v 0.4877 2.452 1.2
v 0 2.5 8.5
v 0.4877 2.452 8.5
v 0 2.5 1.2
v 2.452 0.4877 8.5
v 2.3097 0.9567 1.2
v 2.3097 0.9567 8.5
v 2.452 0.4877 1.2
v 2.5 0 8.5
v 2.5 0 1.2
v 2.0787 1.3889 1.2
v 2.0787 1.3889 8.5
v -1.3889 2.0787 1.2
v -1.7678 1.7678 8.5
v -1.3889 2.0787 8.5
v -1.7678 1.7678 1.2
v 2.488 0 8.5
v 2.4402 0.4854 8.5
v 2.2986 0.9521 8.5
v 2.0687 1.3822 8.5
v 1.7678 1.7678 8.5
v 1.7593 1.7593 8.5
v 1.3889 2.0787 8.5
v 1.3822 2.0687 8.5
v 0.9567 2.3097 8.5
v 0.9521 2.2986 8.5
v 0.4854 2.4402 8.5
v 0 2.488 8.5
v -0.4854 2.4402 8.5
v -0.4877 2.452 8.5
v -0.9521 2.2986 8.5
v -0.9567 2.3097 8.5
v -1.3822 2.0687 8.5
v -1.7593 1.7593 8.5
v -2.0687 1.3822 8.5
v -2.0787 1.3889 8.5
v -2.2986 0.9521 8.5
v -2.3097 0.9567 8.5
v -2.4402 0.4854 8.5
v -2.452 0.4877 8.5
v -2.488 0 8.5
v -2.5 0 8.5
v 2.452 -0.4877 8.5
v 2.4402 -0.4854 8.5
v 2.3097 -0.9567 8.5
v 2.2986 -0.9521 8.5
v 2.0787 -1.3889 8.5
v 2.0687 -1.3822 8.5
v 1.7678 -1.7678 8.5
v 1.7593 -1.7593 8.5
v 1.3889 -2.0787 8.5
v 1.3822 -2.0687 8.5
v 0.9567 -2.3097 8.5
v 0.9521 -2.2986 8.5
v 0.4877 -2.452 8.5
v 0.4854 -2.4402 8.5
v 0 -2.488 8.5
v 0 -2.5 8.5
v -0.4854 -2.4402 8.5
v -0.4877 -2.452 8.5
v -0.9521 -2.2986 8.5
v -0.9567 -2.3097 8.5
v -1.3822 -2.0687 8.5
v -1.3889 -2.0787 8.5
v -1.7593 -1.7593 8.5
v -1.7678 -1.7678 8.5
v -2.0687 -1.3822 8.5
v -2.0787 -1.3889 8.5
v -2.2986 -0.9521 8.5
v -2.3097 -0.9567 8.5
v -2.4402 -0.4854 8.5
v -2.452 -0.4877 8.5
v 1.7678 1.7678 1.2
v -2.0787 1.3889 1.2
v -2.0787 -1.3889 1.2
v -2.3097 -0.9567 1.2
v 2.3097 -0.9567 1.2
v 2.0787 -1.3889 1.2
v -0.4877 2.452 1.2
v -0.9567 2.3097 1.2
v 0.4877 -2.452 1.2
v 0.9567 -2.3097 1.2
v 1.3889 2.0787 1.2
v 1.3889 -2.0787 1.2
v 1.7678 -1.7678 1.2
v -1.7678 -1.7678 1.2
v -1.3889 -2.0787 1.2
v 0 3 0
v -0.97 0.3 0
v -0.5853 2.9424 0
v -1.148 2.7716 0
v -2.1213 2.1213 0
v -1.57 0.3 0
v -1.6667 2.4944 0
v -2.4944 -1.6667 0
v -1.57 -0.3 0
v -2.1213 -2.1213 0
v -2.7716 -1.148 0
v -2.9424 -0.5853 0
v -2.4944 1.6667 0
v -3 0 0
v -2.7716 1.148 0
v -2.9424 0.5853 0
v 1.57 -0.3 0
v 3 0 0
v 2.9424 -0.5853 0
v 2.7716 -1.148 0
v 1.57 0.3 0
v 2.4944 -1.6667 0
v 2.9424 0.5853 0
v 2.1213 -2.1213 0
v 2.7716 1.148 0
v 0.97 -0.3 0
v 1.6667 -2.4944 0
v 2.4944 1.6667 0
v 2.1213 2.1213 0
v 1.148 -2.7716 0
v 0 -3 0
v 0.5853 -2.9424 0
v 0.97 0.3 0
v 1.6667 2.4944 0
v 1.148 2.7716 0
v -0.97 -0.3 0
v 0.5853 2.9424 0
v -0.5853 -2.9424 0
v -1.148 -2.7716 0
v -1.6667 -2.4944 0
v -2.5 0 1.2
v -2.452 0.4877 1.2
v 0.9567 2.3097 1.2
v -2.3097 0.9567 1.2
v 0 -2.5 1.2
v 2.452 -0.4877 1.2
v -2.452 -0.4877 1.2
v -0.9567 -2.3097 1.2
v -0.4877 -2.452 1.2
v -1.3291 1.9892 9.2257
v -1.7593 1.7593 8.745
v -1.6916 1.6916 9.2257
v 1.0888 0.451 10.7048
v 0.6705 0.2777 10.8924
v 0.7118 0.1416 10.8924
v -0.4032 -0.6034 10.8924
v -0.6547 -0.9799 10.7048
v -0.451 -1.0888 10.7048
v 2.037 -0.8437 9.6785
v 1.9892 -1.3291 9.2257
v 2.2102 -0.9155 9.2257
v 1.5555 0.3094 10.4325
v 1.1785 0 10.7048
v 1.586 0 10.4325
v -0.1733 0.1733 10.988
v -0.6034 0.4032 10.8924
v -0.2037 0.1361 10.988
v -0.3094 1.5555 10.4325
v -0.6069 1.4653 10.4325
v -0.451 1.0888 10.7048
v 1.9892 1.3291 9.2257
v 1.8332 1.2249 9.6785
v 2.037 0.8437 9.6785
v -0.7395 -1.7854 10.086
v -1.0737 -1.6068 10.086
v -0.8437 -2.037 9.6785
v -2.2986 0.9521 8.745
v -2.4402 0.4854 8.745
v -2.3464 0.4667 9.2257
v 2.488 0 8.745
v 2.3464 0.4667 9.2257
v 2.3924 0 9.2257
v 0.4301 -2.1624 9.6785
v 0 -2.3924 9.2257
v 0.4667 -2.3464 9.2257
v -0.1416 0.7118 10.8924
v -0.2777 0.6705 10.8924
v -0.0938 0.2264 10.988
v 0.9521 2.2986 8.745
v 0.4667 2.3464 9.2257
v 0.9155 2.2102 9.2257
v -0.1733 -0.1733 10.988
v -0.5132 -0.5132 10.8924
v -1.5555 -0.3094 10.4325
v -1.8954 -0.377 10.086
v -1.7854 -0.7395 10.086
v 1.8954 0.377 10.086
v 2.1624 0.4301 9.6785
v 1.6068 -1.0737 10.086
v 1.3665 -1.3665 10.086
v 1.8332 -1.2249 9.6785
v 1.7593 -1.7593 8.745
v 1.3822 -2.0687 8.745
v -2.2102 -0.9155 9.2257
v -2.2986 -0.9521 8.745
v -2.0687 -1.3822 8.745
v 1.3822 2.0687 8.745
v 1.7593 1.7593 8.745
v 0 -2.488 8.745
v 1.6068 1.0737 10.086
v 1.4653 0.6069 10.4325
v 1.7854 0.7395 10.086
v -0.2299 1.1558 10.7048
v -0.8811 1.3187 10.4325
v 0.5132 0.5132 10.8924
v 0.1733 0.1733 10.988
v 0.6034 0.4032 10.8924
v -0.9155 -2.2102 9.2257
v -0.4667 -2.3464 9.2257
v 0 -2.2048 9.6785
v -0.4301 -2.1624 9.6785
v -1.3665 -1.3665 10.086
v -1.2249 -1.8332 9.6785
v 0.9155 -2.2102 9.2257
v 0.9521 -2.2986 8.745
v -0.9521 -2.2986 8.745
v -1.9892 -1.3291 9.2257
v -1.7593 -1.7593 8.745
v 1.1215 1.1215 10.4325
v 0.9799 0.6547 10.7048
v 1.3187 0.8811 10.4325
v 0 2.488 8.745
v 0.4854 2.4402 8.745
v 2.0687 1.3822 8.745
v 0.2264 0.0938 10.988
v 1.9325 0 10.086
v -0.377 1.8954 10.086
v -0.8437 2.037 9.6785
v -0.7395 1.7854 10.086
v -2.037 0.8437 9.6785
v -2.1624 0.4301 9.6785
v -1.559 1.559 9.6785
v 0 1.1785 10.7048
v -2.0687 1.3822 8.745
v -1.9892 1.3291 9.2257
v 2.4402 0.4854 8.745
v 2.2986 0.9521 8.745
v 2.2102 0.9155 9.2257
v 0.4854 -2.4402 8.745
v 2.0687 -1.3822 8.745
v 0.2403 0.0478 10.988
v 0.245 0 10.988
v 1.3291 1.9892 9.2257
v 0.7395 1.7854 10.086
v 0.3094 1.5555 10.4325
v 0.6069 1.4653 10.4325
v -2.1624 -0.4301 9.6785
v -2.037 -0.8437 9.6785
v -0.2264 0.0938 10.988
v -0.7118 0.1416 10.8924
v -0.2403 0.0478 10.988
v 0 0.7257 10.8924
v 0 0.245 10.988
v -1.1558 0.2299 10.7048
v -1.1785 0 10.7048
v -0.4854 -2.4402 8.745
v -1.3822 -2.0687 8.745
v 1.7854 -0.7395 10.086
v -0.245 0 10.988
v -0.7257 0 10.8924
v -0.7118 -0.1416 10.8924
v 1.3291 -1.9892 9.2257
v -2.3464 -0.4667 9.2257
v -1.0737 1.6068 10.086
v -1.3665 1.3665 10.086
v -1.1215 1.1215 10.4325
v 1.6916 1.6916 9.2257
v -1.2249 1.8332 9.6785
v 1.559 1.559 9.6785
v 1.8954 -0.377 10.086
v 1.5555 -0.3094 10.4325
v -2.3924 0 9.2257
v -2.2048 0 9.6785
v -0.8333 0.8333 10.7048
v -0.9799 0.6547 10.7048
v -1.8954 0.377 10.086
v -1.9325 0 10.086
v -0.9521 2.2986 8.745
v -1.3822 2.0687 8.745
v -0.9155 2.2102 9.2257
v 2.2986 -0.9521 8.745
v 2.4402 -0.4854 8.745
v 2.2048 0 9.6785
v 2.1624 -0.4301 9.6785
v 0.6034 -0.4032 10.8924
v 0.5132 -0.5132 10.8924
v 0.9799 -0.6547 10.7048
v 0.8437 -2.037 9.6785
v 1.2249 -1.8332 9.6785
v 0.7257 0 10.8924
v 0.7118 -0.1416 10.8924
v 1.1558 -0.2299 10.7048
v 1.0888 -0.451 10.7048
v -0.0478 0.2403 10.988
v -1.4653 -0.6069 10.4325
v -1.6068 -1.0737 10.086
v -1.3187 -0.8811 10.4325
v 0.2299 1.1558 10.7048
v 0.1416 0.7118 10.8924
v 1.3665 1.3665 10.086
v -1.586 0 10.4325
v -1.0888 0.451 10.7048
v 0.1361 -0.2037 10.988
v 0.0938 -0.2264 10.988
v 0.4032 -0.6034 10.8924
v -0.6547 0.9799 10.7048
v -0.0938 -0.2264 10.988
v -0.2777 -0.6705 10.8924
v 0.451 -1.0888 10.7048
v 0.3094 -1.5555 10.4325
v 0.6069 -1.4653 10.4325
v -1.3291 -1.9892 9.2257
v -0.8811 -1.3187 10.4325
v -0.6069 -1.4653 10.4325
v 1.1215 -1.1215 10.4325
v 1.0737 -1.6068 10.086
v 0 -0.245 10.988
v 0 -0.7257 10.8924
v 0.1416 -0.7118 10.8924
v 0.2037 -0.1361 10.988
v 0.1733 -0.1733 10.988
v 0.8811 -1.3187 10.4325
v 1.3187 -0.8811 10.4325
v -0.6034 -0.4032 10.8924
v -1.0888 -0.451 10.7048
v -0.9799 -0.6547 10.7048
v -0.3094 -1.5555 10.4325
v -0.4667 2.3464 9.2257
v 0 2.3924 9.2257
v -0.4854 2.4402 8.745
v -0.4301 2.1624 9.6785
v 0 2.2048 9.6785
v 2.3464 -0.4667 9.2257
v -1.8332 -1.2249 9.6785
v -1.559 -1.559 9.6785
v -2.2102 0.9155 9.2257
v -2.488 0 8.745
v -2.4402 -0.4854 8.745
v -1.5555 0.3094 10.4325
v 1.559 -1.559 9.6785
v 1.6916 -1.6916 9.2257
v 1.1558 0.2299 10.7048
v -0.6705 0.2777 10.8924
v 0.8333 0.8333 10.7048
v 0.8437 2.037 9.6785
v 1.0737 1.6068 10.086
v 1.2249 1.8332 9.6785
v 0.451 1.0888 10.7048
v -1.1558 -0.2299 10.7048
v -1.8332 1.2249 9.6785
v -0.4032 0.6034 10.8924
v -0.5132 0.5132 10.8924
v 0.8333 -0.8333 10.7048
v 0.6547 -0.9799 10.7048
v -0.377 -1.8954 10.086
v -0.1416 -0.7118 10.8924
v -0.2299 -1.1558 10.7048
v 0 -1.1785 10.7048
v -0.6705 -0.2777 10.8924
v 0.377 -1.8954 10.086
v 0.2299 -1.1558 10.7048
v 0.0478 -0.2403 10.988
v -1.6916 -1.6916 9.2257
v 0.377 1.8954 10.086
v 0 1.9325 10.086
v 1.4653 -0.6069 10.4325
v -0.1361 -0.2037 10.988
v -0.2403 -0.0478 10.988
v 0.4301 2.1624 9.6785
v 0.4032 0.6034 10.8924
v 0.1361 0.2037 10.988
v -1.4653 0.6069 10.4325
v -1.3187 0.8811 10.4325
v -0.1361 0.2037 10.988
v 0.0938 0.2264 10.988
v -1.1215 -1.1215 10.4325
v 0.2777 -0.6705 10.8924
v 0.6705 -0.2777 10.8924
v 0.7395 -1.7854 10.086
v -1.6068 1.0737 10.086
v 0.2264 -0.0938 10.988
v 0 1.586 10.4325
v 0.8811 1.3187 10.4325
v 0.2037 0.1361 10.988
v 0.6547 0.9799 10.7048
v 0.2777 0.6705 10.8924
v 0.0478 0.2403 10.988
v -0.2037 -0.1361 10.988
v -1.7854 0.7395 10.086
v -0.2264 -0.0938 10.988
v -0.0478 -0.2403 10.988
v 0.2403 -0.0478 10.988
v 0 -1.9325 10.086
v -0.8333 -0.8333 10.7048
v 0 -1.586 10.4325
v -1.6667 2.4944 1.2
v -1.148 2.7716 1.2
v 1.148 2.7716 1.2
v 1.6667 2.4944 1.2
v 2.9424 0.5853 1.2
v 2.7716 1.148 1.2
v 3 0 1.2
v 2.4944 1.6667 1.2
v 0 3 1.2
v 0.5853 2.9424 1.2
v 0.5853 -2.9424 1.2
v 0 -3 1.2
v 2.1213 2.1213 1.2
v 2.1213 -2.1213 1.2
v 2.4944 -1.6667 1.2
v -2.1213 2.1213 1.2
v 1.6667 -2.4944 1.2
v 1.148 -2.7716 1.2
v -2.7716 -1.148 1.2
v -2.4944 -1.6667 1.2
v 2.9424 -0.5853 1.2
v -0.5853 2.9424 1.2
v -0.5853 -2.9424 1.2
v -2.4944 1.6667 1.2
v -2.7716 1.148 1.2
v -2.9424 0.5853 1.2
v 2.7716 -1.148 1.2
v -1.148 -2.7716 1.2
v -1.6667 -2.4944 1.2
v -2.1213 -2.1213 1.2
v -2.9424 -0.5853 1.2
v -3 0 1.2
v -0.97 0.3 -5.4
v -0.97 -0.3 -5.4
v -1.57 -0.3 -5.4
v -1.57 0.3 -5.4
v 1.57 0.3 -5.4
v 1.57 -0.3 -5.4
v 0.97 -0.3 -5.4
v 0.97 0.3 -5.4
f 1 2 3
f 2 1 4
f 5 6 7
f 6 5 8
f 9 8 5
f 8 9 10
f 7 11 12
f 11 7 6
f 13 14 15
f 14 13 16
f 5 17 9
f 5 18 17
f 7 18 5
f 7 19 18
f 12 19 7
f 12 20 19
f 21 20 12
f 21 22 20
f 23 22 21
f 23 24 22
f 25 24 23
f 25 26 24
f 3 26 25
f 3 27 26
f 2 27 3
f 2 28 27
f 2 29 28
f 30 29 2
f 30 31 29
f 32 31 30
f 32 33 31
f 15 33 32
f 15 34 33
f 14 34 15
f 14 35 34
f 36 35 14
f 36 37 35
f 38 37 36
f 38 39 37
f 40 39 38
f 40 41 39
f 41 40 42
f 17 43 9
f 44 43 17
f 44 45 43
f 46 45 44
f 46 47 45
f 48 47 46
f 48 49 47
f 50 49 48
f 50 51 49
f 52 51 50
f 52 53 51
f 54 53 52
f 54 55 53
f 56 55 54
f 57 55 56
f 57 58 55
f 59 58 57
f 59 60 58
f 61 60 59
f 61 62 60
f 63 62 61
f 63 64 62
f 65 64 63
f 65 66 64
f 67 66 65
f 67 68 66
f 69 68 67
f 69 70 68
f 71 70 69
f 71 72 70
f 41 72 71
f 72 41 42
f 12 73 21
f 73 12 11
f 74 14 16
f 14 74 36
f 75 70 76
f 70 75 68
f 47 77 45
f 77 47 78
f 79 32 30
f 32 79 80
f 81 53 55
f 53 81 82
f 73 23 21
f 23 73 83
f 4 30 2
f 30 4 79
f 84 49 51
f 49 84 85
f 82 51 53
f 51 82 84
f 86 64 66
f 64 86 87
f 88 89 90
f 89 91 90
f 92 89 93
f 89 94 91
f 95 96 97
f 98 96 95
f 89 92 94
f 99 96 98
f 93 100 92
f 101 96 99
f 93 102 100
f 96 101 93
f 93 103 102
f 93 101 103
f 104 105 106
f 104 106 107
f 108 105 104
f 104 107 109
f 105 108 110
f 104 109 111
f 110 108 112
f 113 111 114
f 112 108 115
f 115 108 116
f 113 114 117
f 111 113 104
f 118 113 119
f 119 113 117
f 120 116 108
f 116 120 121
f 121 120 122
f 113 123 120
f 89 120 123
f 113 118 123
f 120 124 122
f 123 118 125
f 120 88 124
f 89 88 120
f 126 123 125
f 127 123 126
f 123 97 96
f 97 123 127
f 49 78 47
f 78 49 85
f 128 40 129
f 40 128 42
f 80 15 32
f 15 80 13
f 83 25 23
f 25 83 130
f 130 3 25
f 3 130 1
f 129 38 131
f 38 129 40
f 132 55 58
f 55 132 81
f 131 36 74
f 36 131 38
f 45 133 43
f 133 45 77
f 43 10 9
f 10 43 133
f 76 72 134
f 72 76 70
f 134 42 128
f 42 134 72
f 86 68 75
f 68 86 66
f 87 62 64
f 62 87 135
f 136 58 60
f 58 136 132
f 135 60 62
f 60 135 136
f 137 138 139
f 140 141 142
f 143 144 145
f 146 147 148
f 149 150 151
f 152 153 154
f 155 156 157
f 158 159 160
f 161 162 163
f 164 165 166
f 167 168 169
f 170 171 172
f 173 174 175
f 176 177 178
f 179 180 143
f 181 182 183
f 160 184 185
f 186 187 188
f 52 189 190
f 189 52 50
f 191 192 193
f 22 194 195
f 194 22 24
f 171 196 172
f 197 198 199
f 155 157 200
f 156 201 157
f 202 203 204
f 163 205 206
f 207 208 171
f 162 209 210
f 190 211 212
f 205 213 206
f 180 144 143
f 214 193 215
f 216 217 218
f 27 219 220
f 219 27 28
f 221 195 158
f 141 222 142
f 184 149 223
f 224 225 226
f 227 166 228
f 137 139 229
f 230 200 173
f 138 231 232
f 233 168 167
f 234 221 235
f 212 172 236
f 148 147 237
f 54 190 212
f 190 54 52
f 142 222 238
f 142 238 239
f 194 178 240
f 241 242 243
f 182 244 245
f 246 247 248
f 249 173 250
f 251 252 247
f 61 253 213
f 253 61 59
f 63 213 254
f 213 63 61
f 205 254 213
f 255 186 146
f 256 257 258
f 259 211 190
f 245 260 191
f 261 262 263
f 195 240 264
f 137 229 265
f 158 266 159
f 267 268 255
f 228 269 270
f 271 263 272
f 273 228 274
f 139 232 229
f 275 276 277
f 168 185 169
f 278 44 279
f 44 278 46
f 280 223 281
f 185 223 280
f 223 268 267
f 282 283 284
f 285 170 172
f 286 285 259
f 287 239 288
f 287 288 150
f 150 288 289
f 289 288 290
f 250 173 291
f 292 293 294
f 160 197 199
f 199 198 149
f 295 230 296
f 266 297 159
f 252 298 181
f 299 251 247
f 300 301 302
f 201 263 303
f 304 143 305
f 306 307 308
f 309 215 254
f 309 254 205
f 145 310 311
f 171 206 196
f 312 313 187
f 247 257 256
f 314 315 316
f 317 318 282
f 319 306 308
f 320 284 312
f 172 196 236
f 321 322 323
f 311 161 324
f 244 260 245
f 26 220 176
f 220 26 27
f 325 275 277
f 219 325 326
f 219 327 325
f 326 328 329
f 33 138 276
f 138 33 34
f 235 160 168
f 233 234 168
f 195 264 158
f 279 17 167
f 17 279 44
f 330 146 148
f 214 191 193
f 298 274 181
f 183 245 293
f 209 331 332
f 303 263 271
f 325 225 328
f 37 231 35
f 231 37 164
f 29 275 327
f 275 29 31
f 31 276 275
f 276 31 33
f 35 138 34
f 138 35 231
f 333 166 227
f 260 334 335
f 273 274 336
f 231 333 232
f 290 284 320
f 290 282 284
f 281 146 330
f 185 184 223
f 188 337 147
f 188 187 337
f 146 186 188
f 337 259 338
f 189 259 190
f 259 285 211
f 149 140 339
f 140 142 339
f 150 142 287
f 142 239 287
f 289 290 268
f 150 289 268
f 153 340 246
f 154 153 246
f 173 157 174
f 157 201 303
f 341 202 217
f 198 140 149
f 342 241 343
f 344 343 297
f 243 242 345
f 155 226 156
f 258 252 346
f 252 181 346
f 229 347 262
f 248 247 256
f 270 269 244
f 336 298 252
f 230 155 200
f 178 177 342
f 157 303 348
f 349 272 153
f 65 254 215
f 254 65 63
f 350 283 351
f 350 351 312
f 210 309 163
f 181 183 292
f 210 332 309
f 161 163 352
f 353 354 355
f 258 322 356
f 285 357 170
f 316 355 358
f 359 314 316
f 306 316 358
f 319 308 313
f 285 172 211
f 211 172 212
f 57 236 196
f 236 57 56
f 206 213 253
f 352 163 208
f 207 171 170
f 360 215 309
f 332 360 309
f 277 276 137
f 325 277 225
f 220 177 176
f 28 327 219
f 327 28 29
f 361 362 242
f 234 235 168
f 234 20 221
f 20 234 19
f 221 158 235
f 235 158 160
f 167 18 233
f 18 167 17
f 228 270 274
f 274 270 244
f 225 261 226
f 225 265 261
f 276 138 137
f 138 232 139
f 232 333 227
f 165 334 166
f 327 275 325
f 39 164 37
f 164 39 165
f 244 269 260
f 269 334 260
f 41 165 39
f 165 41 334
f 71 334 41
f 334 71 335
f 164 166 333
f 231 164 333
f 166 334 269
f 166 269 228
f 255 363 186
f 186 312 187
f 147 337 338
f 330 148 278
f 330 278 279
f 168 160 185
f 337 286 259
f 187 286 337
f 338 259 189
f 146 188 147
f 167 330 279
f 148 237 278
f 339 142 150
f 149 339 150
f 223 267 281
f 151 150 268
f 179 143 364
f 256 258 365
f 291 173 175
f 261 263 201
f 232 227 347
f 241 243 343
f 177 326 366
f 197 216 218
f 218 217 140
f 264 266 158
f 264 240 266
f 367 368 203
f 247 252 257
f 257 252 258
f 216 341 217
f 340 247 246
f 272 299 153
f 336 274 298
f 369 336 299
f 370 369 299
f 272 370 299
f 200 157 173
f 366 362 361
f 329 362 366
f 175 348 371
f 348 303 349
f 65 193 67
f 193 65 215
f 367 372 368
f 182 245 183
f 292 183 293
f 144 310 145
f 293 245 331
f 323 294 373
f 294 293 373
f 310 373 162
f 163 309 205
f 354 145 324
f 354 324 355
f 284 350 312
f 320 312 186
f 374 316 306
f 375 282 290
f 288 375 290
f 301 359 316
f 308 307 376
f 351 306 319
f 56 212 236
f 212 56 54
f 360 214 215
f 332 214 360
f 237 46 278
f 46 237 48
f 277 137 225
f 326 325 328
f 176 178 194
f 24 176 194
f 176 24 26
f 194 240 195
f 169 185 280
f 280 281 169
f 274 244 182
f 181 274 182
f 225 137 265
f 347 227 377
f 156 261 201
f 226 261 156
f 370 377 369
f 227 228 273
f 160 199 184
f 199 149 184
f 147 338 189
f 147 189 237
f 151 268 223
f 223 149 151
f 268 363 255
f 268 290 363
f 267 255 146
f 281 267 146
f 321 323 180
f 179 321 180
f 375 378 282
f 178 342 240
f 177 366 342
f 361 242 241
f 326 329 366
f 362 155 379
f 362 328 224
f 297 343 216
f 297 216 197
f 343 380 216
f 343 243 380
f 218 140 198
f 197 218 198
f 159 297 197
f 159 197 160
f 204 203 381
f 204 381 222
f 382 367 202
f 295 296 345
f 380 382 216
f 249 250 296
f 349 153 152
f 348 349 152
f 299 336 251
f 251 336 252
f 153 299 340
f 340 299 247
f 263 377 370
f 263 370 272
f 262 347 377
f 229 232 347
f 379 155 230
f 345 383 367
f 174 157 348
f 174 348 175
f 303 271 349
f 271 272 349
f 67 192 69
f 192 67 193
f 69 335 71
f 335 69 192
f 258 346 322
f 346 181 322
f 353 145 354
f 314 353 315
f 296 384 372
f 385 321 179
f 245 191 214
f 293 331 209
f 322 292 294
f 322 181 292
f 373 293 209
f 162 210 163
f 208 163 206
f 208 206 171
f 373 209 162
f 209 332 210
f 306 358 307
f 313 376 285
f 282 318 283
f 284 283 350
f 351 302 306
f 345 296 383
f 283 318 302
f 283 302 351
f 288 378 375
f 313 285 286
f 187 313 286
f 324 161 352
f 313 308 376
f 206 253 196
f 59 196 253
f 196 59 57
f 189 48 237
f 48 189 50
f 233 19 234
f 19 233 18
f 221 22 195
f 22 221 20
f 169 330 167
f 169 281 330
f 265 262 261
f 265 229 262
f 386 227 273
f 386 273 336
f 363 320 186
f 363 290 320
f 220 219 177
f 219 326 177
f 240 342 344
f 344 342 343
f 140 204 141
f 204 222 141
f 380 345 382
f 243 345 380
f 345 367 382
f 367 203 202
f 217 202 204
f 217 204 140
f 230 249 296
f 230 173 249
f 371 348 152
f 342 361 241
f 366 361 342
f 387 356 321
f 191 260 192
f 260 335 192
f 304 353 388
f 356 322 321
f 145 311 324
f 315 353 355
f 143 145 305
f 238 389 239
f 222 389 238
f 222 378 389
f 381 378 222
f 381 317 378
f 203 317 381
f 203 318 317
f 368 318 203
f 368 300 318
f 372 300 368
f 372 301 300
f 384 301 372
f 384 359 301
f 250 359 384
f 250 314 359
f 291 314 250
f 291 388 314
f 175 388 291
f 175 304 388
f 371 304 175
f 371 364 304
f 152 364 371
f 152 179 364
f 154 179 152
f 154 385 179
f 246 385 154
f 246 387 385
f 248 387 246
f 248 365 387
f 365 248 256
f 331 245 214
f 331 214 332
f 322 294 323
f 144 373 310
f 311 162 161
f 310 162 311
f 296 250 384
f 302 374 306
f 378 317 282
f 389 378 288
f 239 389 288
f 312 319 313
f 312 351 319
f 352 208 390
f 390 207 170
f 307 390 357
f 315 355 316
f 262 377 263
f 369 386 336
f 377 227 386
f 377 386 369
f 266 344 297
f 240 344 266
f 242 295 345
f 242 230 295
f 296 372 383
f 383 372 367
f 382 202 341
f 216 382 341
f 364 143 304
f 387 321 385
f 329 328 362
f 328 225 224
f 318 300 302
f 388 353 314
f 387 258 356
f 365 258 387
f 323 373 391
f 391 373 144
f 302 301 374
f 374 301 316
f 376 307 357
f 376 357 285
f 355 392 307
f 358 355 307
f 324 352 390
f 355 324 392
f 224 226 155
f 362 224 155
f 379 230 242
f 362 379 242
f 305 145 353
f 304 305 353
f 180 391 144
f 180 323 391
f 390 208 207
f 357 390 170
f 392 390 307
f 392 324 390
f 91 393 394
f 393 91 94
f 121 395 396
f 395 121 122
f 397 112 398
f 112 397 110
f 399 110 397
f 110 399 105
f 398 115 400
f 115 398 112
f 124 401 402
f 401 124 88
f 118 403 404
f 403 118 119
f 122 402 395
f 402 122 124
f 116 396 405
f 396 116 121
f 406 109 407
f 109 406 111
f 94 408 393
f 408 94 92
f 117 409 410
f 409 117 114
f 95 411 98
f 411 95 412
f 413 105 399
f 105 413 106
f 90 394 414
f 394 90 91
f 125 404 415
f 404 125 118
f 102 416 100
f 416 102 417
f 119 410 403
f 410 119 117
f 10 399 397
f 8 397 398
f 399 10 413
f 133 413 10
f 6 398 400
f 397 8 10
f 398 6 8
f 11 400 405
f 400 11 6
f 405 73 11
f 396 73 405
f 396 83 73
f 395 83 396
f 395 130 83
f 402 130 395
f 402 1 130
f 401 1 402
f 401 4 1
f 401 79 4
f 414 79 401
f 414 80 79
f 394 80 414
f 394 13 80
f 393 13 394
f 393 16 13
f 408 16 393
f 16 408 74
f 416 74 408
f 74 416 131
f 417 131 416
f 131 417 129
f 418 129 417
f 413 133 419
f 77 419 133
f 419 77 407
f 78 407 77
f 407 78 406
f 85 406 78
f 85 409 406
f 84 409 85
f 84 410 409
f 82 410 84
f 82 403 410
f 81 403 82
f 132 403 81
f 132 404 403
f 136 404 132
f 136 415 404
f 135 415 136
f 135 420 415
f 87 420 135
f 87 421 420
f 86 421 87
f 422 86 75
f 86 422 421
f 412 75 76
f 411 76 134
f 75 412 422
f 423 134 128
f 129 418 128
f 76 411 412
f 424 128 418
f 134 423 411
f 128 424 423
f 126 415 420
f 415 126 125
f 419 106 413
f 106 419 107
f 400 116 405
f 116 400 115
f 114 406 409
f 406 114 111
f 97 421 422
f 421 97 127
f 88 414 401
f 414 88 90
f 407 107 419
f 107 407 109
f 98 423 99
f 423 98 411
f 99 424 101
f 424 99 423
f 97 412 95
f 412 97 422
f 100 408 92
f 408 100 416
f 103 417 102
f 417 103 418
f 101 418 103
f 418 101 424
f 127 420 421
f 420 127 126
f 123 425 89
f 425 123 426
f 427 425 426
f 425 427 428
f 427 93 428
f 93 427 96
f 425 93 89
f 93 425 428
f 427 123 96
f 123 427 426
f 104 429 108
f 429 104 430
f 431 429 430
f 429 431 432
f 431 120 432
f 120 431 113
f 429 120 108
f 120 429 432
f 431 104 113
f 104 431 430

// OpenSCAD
// Parameters
type = 0; //[0:2:1]
colour = 0; //[0:5:1]
lead = 5; //[2.5:10:0.5]
right_angle = 0; //[0:12:1]
eps = 0.8; //[0.5:2:0.1]
led_d = 5; //[3:10:1]
led_h = 8.5; //[5:17:0.5]
rim_t = 1.2; //[0.6:2.4:0.1]
rim_d = 6; //[3.6:12:0.2]
lead_t = 0.6; //[0.4:1.2:0.05]
lead_pitch = 2.54; //[1.5:5:0.01]
bend_r = 0.8; //[0.4:2:0.1]

// LED Module
module led() {
  // LED Body
  color("red") {
    union() {
      // Main cylindrical body
      translate([0, 0, led_h/2])
        cylinder(r=led_d/2, h=led_h, center=true, $fn=32);
      // Dome on top
      translate([0, 0, led_h])
        sphere(r=led_d/2, $fn=32);
      // Rim at the base
      translate([0, 0, rim_t/2])
        cylinder(r=rim_d/2, h=rim_t, center=true, $fn=32);
    }
  }
  
  // LED Leads
  color("Silver") {
    if (right_angle == 0) {
      // Straight leads
      union() {
        translate([-lead_pitch/2, 0, -(lead + eps)/2 + eps/2])
          cube([lead_t, lead_t, lead + eps], center=true);
        translate([lead_pitch/2, 0, -(lead + eps)/2 + eps/2])
          cube([lead_t, lead_t, lead + eps], center=true);
      }
    } else {
      // Right-angle leads
      union() {
        // Vertical part of the bend
        translate([-lead_pitch/2, 0, -(right_angle + eps)/2 + eps/2])
          cube([lead_t, lead_t, right_angle + eps], center=true);
        translate([lead_pitch/2, 0, -(right_angle + eps)/2 + eps/2])
          cube([lead_t, lead_t, right_angle + eps], center=true);
        
        // Horizontal part of the bend
        translate([-lead_pitch/2, -(right_angle + eps)/2 - lead_t/2 + eps/2, -right_angle + lead_t/2])
          cube([lead_t, right_angle + eps, lead_t], center=true);
        translate([lead_pitch/2, -(right_angle + eps)/2 - lead_t/2 + eps/2, -right_angle + lead_t/2])
          cube([lead_t, right_angle + eps, lead_t], center=true);
        
        // After bend
        translate([-lead_pitch/2, -(right_angle + eps) - (lead + eps)/2 - lead_t + eps, -right_angle + lead_t/2])
          cube([lead_t, lead + eps, lead_t], center=true);
        translate([lead_pitch/2, -(right_angle + eps) - (lead + eps)/2 - lead_t + eps, -right_angle + lead_t/2])
          cube([lead_t, lead + eps, lead_t], center=true);
        
        // Bend corners
        translate([-lead_pitch/2, -lead_t/2, -right_angle])
          sphere(r=bend_r, $fn=16);
        translate([lead_pitch/2, -lead_t/2, -right_angle])
          sphere(r=bend_r, $fn=16);
      }
    }
  }
}

// Assembly
module assembly() {
  led();
}

assembly();
